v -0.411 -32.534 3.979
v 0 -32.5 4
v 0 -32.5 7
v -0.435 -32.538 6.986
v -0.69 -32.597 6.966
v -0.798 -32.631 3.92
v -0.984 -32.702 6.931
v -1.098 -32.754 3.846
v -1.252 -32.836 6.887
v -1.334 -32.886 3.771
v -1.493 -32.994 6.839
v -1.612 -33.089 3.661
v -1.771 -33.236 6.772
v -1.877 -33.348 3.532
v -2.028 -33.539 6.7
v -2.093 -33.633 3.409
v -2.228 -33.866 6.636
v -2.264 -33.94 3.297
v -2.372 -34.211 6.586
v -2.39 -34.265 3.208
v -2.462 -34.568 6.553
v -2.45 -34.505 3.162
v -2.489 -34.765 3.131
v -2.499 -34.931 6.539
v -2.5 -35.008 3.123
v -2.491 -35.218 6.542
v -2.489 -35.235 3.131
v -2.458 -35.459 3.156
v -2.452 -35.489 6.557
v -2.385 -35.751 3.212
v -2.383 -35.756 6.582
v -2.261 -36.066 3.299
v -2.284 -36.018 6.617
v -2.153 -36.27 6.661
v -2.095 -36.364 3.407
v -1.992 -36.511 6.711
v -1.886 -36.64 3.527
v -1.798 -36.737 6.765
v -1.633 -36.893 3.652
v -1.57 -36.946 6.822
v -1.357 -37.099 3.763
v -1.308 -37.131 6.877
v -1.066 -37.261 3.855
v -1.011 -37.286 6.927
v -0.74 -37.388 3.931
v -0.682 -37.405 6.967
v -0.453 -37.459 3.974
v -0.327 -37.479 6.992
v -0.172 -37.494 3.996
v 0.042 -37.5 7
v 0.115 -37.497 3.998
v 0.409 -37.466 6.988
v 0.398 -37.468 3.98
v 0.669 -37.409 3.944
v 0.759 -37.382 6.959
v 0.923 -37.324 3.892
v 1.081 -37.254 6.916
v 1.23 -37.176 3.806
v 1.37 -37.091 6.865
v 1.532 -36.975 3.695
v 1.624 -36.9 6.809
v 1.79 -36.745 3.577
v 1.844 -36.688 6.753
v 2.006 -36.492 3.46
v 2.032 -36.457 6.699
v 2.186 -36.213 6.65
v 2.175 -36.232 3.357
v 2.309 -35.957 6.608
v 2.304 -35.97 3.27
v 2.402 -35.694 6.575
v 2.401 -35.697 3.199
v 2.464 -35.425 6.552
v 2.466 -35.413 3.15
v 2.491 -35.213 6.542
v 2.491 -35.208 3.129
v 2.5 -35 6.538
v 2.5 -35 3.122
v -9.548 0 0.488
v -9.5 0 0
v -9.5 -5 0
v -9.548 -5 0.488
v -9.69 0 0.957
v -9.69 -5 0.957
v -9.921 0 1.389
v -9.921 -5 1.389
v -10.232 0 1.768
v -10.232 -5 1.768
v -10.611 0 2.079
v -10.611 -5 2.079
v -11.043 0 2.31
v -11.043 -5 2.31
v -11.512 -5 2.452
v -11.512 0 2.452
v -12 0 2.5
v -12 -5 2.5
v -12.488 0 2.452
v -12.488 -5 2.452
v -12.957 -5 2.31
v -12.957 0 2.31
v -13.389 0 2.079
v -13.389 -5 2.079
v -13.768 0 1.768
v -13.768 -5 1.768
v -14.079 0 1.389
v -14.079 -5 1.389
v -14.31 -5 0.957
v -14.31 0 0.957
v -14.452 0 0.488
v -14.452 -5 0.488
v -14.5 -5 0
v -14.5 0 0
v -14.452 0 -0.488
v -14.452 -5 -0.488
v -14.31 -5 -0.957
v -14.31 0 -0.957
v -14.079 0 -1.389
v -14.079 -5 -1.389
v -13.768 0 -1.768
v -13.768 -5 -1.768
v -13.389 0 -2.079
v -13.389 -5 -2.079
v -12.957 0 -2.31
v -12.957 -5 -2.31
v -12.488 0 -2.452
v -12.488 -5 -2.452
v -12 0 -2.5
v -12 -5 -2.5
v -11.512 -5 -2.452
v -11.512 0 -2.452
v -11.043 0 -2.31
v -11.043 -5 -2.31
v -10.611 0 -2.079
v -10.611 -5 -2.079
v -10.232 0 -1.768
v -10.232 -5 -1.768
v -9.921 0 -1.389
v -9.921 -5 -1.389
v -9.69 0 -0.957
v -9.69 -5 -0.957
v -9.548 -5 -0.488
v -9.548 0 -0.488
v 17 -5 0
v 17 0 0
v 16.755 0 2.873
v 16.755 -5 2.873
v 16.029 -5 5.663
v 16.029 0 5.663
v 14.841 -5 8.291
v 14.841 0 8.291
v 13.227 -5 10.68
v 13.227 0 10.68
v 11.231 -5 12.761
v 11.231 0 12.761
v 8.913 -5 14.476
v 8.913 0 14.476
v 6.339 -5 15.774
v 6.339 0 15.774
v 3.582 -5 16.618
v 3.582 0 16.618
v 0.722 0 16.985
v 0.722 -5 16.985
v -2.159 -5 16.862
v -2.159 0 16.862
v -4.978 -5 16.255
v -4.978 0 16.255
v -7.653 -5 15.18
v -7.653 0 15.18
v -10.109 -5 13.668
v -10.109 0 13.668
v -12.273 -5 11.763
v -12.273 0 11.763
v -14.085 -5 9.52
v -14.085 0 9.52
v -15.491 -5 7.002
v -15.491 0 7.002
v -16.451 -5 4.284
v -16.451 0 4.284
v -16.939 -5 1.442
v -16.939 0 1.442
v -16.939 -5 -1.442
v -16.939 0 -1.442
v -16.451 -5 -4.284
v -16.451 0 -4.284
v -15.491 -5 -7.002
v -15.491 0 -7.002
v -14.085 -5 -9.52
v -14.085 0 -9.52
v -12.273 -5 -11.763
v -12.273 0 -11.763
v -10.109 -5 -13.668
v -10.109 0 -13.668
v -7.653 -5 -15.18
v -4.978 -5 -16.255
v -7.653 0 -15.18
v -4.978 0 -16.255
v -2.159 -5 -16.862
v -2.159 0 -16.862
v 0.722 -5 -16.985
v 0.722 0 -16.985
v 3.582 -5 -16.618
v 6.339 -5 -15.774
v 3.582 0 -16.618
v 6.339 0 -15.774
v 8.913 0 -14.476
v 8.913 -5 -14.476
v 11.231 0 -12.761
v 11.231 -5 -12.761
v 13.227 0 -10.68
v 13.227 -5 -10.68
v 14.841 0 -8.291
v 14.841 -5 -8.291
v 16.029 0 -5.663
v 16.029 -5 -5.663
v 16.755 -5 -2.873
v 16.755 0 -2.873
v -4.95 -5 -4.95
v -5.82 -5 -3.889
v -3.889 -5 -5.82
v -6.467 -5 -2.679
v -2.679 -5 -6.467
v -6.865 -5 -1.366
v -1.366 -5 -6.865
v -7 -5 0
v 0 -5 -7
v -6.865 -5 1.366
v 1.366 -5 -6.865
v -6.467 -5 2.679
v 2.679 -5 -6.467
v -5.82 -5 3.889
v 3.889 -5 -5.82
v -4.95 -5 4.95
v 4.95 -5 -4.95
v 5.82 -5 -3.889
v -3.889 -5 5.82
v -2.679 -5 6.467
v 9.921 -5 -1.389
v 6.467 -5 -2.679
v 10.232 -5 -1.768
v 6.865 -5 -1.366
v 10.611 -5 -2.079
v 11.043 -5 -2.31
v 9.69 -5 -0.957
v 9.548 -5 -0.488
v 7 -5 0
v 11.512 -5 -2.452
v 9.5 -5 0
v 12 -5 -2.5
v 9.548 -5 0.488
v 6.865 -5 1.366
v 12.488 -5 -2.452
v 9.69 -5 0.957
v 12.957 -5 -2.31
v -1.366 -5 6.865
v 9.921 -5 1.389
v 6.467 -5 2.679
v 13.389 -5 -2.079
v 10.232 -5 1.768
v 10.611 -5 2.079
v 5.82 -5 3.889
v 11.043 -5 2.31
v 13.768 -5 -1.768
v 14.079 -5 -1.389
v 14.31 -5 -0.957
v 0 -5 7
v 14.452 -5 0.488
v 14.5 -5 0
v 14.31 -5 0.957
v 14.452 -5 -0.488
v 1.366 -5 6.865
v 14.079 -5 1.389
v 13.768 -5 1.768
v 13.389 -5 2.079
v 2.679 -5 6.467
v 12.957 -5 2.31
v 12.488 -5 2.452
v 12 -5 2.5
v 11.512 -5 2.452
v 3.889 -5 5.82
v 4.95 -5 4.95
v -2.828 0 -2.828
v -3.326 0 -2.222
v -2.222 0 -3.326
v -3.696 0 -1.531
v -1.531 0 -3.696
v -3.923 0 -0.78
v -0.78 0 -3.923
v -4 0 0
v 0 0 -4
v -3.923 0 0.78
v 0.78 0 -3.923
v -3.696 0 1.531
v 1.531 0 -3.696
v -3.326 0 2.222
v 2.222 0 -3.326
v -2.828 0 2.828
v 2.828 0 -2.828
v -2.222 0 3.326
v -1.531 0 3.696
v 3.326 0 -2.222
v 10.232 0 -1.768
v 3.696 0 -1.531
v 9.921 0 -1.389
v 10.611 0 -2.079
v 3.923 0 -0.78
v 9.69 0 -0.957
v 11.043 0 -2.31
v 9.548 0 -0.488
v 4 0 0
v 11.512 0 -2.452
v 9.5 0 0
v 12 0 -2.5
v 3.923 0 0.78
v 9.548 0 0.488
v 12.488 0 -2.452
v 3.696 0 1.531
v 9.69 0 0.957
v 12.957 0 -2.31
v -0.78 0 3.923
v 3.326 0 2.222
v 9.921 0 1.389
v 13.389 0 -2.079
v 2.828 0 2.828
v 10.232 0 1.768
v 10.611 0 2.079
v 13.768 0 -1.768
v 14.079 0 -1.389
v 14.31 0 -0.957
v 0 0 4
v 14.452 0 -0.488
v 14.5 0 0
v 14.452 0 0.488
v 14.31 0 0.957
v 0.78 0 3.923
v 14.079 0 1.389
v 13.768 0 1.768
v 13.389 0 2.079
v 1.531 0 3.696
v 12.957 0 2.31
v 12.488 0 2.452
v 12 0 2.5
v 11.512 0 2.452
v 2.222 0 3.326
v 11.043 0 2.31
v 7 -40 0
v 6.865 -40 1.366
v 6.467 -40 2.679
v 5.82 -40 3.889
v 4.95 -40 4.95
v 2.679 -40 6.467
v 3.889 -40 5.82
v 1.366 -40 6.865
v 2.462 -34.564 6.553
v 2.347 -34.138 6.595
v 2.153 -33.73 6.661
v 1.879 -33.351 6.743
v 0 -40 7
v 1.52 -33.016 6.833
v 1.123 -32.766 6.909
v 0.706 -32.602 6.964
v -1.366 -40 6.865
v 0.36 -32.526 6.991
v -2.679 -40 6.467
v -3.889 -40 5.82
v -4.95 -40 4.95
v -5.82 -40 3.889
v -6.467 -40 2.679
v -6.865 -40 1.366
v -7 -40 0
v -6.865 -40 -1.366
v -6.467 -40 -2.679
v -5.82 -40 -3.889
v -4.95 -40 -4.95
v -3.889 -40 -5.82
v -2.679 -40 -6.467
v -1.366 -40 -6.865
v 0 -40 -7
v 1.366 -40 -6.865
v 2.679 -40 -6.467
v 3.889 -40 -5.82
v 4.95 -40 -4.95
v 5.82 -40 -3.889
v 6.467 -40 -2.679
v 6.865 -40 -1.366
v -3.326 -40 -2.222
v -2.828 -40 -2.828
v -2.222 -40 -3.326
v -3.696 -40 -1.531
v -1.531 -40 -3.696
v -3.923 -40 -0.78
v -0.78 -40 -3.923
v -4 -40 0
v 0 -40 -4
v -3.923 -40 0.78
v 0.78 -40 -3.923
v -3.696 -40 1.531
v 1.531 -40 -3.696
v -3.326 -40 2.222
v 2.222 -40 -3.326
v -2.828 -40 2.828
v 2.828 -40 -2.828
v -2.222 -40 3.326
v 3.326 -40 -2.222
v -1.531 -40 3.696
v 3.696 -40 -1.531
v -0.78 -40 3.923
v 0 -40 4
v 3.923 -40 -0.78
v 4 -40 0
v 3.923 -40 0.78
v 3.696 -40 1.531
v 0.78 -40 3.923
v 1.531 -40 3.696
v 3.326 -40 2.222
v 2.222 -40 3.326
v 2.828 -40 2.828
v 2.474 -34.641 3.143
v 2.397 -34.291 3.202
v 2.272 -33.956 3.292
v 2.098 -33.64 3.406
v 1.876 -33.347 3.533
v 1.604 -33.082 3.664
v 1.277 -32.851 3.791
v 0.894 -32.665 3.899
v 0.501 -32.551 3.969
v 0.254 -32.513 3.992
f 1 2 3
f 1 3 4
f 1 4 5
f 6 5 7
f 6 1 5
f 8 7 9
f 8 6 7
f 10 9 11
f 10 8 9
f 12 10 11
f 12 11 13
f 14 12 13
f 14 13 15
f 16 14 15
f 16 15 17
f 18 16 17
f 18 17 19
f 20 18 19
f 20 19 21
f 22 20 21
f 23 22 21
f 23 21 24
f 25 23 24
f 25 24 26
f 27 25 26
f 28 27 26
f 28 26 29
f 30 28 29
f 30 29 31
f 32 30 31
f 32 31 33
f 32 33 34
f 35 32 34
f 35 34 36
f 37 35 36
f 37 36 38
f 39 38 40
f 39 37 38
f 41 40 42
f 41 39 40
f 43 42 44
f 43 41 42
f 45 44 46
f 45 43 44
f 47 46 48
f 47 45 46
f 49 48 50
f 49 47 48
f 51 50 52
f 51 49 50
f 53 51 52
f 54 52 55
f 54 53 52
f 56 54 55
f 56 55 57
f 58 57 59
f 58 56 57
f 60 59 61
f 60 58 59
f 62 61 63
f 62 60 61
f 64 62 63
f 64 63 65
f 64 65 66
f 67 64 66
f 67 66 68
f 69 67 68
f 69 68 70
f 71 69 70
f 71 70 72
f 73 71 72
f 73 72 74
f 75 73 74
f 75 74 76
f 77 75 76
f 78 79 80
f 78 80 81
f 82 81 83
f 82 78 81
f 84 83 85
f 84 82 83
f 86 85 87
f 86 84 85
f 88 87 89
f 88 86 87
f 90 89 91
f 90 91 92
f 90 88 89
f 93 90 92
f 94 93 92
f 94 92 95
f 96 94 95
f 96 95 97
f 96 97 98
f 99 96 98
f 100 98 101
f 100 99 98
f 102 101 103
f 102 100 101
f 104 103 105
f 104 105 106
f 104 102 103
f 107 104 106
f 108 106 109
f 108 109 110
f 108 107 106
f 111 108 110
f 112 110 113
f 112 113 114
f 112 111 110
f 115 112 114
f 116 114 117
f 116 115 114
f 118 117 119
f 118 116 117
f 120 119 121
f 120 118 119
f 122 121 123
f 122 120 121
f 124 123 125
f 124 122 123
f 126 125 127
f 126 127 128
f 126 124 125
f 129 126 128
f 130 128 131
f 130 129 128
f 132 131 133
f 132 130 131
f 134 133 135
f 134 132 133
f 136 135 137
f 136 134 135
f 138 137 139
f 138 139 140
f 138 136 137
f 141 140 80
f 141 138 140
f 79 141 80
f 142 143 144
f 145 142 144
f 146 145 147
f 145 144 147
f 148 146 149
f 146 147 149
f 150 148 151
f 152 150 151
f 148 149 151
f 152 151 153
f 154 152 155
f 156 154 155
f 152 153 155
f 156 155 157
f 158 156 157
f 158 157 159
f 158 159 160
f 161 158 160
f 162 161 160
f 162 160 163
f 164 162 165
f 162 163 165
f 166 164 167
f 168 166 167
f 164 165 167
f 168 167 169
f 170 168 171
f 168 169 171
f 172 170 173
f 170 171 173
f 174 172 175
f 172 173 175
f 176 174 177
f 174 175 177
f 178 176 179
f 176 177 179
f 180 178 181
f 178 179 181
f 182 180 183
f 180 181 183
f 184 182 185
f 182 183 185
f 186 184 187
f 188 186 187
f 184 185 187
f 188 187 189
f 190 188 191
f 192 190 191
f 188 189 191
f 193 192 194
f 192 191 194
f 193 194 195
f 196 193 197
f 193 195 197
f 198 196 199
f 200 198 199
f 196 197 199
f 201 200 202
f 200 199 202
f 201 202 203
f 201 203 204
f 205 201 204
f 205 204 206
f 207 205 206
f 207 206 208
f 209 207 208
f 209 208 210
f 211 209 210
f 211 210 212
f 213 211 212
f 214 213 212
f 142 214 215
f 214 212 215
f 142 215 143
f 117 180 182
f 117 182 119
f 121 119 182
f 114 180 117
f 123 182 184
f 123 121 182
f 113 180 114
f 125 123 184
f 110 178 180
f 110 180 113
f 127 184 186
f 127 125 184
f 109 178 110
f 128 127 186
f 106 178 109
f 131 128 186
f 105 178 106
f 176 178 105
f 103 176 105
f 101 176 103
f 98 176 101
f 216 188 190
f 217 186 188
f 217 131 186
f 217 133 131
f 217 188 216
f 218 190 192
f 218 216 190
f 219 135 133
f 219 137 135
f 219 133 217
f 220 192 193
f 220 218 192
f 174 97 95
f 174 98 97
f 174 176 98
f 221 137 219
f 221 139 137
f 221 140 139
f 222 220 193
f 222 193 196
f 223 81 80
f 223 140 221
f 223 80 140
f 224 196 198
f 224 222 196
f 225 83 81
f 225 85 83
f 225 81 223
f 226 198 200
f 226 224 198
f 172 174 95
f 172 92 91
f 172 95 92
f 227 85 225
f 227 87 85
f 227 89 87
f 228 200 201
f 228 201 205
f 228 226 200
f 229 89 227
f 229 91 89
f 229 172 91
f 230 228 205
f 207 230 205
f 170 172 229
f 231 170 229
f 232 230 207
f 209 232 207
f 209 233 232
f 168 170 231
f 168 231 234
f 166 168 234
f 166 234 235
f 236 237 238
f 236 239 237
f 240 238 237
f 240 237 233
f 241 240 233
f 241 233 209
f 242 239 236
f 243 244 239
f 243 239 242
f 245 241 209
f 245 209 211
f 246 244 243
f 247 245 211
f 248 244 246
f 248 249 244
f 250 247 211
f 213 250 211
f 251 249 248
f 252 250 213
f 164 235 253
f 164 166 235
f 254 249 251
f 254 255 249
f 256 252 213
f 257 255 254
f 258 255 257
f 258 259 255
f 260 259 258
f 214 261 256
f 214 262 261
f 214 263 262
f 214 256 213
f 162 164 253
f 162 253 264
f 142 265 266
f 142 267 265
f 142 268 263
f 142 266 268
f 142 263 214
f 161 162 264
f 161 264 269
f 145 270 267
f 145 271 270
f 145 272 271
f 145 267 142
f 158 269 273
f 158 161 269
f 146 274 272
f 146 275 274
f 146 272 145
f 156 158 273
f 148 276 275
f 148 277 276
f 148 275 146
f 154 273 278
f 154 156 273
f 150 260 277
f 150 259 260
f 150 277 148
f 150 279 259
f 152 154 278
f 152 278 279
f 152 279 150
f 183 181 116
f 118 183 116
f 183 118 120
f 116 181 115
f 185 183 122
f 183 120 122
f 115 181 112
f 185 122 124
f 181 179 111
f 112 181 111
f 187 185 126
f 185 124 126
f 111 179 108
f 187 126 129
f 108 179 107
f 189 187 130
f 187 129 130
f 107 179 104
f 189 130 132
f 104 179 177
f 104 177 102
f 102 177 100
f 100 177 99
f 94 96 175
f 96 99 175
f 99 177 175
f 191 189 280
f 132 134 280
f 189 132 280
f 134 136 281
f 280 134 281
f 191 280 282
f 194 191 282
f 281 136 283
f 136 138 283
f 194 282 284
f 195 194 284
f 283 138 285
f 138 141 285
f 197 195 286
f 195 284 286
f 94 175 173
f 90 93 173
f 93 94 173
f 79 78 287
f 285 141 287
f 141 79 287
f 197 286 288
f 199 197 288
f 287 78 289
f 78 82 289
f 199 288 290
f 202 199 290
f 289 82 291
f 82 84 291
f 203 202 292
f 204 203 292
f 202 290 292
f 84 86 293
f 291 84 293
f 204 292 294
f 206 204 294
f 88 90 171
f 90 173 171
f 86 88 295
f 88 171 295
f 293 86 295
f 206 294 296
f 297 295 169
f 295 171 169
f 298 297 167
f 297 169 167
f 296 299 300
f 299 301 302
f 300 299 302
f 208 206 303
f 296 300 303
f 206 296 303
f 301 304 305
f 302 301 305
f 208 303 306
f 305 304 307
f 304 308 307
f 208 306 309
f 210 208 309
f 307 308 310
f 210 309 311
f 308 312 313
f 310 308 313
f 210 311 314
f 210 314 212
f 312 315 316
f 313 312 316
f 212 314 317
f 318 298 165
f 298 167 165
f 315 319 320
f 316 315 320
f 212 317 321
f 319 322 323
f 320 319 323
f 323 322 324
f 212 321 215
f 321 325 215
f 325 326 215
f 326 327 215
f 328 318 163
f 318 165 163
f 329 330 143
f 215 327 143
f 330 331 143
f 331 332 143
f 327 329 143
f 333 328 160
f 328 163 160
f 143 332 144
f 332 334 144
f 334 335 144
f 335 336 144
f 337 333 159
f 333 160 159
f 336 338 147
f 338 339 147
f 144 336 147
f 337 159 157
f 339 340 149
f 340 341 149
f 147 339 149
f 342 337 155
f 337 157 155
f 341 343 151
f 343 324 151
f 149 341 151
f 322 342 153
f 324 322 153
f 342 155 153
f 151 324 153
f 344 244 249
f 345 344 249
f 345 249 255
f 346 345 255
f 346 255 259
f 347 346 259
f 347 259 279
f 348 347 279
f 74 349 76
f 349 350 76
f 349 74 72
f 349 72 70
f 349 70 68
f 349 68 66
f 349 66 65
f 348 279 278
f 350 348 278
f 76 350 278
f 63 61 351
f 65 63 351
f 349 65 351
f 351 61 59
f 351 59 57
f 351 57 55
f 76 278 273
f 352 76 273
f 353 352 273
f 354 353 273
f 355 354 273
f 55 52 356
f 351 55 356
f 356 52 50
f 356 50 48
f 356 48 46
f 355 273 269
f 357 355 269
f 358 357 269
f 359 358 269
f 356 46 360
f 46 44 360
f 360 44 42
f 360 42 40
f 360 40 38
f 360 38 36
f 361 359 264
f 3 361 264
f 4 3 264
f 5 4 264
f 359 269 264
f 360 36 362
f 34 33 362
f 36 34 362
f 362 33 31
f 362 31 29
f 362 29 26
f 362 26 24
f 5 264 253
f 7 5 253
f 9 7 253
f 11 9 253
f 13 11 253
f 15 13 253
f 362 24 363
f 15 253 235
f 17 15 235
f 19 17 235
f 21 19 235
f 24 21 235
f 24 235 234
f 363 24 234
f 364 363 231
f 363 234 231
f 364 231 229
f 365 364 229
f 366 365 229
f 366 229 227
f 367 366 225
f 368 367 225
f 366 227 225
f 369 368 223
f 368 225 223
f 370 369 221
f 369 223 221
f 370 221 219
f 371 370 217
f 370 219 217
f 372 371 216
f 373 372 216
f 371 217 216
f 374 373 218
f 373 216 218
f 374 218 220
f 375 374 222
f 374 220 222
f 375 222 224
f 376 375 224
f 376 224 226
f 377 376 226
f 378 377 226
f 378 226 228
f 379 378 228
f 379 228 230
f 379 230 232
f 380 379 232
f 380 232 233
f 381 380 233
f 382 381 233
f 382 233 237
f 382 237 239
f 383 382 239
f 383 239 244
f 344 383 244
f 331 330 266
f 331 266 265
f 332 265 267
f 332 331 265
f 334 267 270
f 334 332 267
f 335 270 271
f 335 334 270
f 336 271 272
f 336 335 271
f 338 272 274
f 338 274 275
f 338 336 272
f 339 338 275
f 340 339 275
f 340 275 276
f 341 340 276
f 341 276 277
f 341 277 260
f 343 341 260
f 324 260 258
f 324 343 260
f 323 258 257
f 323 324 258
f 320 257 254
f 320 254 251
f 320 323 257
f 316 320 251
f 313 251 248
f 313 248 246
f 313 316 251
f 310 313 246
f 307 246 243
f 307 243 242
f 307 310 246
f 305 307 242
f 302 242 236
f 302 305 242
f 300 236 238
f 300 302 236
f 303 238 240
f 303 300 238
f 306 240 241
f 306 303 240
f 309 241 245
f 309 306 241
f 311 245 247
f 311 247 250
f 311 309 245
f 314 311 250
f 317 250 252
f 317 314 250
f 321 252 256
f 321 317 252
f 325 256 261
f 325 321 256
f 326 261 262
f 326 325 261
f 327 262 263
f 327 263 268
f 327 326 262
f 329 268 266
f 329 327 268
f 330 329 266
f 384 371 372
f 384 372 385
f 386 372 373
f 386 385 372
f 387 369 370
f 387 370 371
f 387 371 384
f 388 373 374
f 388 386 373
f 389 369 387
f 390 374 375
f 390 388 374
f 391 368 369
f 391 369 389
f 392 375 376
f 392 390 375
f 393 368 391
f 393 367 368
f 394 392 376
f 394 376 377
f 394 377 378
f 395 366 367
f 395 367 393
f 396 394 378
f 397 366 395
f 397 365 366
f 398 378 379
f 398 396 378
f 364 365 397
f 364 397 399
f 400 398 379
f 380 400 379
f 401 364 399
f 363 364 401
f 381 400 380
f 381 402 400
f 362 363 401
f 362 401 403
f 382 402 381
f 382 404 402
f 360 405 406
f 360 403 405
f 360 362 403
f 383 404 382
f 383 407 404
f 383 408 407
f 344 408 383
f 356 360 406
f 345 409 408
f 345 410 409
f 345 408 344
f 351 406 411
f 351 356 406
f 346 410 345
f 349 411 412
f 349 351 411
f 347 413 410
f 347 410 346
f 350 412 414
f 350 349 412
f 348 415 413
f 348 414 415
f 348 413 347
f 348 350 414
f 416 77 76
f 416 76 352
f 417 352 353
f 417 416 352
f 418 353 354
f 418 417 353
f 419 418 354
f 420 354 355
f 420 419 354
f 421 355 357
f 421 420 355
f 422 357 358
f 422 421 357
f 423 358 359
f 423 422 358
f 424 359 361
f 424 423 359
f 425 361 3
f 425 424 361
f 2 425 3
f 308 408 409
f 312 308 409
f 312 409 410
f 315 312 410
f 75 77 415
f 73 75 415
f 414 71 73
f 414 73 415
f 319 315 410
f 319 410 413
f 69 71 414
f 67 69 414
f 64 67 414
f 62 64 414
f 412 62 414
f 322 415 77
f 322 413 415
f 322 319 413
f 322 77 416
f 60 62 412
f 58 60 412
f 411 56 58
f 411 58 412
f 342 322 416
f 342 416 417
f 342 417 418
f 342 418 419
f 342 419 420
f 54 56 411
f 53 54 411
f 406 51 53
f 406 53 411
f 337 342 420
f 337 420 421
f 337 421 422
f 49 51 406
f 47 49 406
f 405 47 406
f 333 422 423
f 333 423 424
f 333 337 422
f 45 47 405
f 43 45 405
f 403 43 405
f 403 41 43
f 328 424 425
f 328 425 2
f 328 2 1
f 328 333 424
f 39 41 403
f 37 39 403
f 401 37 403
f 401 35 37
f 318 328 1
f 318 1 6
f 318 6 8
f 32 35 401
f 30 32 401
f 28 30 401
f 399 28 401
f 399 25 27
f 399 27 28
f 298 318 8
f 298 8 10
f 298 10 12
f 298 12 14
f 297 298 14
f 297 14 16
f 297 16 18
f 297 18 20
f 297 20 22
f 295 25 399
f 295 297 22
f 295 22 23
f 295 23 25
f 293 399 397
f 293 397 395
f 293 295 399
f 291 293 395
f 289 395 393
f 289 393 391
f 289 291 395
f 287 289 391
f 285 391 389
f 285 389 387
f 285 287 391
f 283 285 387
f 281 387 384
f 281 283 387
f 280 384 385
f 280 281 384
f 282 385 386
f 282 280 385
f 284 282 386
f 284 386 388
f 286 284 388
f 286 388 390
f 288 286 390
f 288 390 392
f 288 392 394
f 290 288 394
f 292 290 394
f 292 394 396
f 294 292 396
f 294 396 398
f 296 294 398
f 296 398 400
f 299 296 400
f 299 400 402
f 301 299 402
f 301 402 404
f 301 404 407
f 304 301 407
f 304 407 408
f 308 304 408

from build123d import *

# Parameters (mm, degrees)
F0_R     = 17
F0_R_2   = 2.5
F0_R_3   = 7
F1_DEPTH = 5
F0_R_4   = 4
F2_DEPTH = 40
F4_DEPTH = 10


with BuildPart() as f1:
    # F0 (on Front) → F1 (new body)
    with BuildSketch(Plane.XZ):
        Circle(F0_R)
        with Locations((-12, 0)):
            Circle(F0_R_2, mode=Mode.SUBTRACT)
        Circle(F0_R_3, mode=Mode.SUBTRACT)
        with Locations((12, 0)):
            Circle(F0_R_2, mode=Mode.SUBTRACT)
    extrude(amount=F1_DEPTH)

    # F0 (on Front) → F2 (join)
    with BuildSketch(Plane.XZ):
        Circle(F0_R_3)
        Circle(F0_R_4, mode=Mode.SUBTRACT)
    extrude(amount=F2_DEPTH)

    # F3 (on Top) → F4 (cut)
    with BuildSketch(Plane.XY):
        with BuildLine():
            ThreePointArc((0, -32.5), (-1.767767, -36.767767), (2.5, -35))
            ThreePointArc((2.5, -35), (1.767767, -33.232233), (0, -32.5))
        make_face()
    extrude(amount=F4_DEPTH, mode=Mode.SUBTRACT)


solid = f1.part
